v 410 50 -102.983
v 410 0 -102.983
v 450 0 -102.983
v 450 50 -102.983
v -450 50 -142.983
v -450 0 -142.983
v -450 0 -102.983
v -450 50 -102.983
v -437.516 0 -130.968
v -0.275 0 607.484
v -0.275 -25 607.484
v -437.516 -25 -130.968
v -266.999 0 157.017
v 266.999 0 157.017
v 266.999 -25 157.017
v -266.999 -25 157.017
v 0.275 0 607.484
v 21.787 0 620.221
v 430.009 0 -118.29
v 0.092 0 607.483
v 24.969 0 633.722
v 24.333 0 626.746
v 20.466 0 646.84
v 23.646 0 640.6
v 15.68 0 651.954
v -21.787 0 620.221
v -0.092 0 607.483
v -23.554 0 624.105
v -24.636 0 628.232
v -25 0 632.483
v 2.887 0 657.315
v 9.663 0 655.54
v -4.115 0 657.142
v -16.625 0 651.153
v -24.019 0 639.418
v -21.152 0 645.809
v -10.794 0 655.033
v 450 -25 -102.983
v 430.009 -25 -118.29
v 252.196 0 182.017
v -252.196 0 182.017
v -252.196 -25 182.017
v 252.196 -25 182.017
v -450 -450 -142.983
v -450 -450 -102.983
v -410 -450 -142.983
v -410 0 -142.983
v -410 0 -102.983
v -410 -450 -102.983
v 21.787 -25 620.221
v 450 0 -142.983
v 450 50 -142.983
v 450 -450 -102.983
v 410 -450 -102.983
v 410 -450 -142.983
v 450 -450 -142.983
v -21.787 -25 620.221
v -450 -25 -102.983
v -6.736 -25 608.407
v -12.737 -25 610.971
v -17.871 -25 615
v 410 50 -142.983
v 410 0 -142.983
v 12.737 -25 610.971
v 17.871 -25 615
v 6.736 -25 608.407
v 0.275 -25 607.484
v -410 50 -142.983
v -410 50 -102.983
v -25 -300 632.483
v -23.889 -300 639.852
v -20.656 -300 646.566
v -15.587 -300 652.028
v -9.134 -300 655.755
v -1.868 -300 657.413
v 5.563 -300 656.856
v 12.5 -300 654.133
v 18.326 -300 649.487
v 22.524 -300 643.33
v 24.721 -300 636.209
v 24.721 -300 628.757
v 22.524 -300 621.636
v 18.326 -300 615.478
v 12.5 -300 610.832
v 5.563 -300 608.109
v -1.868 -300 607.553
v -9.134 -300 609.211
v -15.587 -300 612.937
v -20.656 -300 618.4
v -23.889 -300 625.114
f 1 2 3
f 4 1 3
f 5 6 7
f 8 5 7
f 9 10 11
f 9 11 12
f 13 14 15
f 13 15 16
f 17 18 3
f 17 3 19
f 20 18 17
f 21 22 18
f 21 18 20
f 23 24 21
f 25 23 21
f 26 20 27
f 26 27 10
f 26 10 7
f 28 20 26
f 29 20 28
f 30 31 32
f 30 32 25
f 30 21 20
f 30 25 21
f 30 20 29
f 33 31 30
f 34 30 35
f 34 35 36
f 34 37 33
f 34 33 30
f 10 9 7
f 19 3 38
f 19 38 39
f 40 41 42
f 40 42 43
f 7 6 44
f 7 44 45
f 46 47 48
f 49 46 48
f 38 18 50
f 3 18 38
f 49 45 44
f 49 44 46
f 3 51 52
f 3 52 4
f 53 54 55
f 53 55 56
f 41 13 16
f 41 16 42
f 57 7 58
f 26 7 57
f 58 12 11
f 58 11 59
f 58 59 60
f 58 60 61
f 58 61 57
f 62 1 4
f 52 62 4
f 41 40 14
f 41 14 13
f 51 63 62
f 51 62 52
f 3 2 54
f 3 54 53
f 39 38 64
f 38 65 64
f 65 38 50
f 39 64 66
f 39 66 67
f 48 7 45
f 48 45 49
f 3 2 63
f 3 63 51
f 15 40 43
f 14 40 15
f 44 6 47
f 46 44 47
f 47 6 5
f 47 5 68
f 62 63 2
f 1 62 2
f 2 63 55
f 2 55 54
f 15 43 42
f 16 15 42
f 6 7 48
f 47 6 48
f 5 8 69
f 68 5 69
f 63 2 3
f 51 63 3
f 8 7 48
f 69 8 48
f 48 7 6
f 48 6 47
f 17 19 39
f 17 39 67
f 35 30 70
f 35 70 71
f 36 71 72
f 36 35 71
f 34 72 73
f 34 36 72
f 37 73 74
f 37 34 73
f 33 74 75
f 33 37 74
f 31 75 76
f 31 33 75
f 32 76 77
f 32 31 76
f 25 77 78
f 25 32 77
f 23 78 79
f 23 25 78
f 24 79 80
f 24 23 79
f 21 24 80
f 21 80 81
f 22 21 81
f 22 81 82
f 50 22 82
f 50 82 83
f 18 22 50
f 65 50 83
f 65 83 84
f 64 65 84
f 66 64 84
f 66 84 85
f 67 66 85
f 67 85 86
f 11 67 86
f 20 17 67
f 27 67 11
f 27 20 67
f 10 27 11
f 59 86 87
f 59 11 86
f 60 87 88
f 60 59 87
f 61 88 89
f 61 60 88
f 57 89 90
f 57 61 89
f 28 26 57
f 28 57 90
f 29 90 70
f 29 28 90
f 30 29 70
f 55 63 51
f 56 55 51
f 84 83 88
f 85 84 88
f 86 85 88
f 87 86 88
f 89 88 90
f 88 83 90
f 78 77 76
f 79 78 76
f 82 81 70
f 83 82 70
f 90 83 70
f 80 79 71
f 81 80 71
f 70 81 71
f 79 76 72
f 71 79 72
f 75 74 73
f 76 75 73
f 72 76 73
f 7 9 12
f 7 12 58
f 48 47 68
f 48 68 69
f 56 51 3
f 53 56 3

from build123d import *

# Parameters (mm, degrees)
F0_W     = 40
F0_H     = 40
F1_DEPTH = 450
F3_DEPTH = 25
F4_R     = 25
F5_DEPTH = 300
F6_DEPTH = 50
F8_DEPTH = 25


with BuildPart() as f1:
    # F0 (on Front) → F1 (new body)
    with BuildSketch(Plane.XZ):
        with Locations((-430, -122.983089)):
            Rectangle(F0_W, F0_H)
        with Locations((430, -122.983089)):
            Rectangle(F0_W, F0_H)
    extrude(amount=F1_DEPTH)


with BuildPart() as f3:
    # F2 (on face) → F3 (new body)
    with BuildSketch(Plane(origin=(0, 0, 0), x_dir=(-1, 0, 0), z_dir=(0, 1, 0))):
        Polygon((0, 657.016911), (-450, -102.983089), (-430.009371, -118.289622), (0, 607.948427), (437.516174, -130.967778), (450, -102.983089), align=None)
    extrude(amount=-F3_DEPTH)

    # F4 (on face) → F5 (join)
    with BuildSketch(Plane(origin=(0, 0, 0), x_dir=(-1, 0, 0), z_dir=(0, 1, 0))):
        with Locations((0, 632.482669)):
            Circle(F4_R)
    extrude(amount=-F5_DEPTH)


with BuildPart() as f6:
    # F0 (on Front) → F6 (new body)
    with BuildSketch(Plane.XZ):
        with Locations((-430, -122.983089)):
            Rectangle(F0_W, F0_H)
        with Locations((430, -122.983089)):
            Rectangle(F0_W, F0_H)
    extrude(amount=-F6_DEPTH)


with BuildPart() as f8:
    # F7 (on face) → F8 (new body)
    with BuildSketch(Plane(origin=(0, 0, 0), x_dir=(-1, 0, 0), z_dir=(0, 1, 0))):
        Polygon((-252.196293, 182.016911), (-266.998924, 157.016911), (266.998924, 157.016911), (252.196293, 182.016911), align=None)
    extrude(amount=-F8_DEPTH)


solid = Compound([f1.part, f3.part, f6.part, f8.part])
